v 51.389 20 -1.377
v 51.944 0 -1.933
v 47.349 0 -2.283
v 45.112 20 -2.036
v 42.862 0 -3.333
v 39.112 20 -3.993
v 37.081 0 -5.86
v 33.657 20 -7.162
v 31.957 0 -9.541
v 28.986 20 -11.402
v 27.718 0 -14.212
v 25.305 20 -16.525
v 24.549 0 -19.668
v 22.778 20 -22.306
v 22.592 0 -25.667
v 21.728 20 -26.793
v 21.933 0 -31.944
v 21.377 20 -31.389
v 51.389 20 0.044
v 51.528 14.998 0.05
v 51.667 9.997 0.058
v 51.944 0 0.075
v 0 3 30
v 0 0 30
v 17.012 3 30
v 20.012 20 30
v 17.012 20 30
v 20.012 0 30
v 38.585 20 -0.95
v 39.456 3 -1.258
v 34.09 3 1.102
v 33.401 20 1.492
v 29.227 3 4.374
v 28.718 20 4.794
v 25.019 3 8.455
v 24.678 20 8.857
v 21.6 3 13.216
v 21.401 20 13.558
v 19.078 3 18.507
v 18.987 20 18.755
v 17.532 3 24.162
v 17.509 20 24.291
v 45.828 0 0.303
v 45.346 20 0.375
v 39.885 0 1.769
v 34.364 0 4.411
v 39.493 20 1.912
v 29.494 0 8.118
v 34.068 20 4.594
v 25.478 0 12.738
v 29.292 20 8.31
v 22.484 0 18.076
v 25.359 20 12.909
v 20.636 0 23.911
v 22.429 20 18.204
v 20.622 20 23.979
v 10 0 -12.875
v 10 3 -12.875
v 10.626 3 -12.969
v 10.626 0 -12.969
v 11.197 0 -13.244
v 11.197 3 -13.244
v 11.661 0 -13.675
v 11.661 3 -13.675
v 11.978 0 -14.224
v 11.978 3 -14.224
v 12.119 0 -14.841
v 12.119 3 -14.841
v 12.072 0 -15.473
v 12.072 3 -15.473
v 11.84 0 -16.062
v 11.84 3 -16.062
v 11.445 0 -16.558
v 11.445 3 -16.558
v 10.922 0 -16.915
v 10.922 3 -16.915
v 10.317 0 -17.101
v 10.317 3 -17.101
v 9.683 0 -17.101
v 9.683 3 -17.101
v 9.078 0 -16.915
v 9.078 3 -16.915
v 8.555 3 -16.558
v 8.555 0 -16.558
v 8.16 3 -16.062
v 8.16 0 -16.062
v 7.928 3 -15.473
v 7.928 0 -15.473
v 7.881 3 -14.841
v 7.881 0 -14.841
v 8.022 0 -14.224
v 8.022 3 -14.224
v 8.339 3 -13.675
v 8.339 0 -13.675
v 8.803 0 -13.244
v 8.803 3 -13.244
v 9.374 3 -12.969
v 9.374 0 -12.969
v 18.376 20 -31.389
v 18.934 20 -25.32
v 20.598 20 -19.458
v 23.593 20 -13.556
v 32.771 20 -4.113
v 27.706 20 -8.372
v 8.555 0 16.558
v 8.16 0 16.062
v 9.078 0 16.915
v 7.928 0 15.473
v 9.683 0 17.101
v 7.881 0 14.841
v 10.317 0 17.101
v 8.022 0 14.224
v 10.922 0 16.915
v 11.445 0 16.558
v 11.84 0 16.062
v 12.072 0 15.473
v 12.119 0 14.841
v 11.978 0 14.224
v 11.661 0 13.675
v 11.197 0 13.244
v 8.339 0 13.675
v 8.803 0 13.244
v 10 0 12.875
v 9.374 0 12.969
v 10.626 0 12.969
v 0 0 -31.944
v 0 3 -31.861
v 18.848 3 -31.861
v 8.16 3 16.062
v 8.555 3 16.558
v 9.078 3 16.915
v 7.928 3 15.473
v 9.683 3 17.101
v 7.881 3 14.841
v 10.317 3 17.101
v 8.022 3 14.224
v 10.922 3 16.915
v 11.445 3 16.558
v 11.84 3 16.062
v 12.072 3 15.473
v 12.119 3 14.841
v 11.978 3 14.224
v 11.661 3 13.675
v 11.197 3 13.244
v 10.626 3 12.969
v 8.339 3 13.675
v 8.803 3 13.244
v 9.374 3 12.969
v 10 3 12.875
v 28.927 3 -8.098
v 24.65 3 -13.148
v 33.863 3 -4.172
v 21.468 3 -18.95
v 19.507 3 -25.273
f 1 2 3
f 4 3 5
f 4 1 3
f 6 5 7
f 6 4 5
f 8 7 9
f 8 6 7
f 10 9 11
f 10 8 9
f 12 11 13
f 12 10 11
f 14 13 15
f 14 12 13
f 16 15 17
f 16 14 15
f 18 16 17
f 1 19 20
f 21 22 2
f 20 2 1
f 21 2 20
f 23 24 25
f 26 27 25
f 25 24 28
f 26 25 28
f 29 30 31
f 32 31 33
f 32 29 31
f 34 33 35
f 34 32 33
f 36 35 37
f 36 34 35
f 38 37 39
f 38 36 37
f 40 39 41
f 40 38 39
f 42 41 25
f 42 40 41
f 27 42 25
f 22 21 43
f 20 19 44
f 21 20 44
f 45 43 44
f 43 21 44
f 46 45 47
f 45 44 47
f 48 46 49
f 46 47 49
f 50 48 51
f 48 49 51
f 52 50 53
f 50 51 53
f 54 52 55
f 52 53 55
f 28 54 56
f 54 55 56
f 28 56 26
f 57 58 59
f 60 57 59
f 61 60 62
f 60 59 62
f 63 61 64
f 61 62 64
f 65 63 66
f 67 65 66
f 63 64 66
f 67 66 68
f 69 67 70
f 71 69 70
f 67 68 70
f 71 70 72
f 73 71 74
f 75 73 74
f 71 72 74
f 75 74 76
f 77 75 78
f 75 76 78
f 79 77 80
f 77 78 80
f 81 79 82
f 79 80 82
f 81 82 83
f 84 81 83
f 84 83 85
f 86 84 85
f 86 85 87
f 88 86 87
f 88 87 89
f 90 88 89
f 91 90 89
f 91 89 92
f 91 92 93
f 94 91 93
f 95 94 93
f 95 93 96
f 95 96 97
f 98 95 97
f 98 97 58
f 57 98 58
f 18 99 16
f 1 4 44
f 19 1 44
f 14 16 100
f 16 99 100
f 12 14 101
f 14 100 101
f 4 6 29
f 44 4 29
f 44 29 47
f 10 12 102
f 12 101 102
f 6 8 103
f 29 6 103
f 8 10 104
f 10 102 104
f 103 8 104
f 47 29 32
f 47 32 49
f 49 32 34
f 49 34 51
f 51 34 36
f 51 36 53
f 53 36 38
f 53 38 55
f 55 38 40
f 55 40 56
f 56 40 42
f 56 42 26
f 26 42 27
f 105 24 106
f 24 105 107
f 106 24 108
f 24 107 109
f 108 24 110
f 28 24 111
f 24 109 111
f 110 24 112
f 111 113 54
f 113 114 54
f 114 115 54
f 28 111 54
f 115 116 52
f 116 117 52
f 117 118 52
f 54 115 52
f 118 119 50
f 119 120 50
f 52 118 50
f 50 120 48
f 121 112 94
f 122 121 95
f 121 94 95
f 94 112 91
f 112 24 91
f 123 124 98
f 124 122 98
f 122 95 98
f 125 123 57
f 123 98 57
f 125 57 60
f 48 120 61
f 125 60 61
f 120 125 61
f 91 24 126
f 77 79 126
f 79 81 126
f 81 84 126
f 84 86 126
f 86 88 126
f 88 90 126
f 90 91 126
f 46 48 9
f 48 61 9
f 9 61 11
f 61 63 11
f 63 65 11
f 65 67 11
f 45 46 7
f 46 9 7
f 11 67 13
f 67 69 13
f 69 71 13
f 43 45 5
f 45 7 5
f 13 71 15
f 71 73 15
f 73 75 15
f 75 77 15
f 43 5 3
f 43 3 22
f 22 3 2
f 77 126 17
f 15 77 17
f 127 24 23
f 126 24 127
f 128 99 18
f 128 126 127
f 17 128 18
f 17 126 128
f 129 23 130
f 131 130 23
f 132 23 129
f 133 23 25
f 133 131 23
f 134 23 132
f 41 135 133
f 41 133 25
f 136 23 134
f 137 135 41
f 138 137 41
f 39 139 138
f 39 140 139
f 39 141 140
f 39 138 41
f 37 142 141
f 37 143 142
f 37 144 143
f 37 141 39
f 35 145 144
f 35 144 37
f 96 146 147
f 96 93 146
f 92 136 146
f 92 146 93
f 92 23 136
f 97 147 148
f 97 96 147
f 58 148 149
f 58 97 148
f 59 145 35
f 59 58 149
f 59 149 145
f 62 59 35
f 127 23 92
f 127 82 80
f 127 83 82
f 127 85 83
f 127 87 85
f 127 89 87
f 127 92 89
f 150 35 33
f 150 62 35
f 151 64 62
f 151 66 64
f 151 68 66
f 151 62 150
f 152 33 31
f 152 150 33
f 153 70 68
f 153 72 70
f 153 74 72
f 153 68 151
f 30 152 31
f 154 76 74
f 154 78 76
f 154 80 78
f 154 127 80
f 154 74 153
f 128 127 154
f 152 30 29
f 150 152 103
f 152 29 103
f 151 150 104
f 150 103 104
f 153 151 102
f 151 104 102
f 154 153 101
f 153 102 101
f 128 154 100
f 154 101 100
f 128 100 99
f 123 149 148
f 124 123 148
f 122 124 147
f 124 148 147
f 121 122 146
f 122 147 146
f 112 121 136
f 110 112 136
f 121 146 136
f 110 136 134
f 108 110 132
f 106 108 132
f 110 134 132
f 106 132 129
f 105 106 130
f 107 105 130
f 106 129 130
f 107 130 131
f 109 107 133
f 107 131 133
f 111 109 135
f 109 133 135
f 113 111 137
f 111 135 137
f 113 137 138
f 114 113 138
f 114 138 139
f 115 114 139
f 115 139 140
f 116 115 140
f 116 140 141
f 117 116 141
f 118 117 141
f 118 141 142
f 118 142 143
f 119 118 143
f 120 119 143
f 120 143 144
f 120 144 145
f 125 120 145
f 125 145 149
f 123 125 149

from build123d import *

# Parameters (mm, degrees)
SKETCH_1_W               = 50
SKETCH_1_H               = 60
EXTRUDE_1_DEPTH          = 70
DRAFT_1_ANGLE            = 1.591
CUT_EXTRUDE_1_DEPTH      = 105.880884817
CUT_EXTRUDE_1_DEPTH_BACK = 105.880884817
SKETCH_8_R               = 30
SKETCH_9_R               = 29.988439116
CUT_EXTRUDE_2_DEPTH      = 93.836652593
SKETCH_10_W              = 61.388766385
SKETCH_10_H              = 50
CUT_EXTRUDE_3_DEPTH      = 93.836652759
SHELL_1_T                = -3
SKETCH_11_R              = 2.125
CUT_EXTRUDE_4_DEPTH      = 64.305956024


with BuildPart() as part:
    # 草圖1 → 填料-伸長1 (new body)
    with BuildSketch(Plane(origin=(0, 0, 0), x_dir=(1, 0, 0), z_dir=(0, 1, 0))):
        with Locations((25, 0)):
            Rectangle(SKETCH_1_W, SKETCH_1_H)
    extrude(amount=EXTRUDE_1_DEPTH)

    # 拔模1
    draft_1_faces = [part.faces().sort_by_distance(p)[0] for p in [
        (50, 35, 0),
        (25, 35, -30),
    ]]
    draft(draft_1_faces, Plane.ZX.offset(70), DRAFT_1_ANGLE)

    # 草圖8 → 除料-伸長1 (cut, two sides: drawn at the far end of the back side and taken through both)
    with BuildSketch(Plane(origin=(50, 70, -30), x_dir=(0.9996147856379402, 0.027743225206125616, 0.0007705771714084014), z_dir=(0.027753924659674706, -0.9992294227713525, -0.027753924659674706)).offset(-CUT_EXTRUDE_1_DEPTH_BACK)):
        Circle(SKETCH_8_R)
    extrude(amount=CUT_EXTRUDE_1_DEPTH + CUT_EXTRUDE_1_DEPTH_BACK, mode=Mode.SUBTRACT)

    # 草圖9 → 除料-伸長2 (cut, through all)
    with BuildSketch(Plane(origin=(0, 70, 0), x_dir=(1, 0, 0), z_dir=(0, 1, 0))):
        with Locations((50, -30)):
            Circle(SKETCH_9_R)
    extrude(amount=-CUT_EXTRUDE_2_DEPTH, mode=Mode.SUBTRACT)

    # 草圖10 → 除料-伸長3 (cut, through all)
    with BuildSketch(Plane.ZY):
        with Locations((-0.694383192, 45)):
            Rectangle(SKETCH_10_W, SKETCH_10_H)
    extrude(amount=-CUT_EXTRUDE_3_DEPTH, mode=Mode.SUBTRACT)

    # 薄殼1
    shell_1_openings = [part.faces().sort_by_distance(p)[0] for p in [
        (14.872442298, 20, -1.069608967),
        (10.828073147, 9.957245624, -31.667707178),
        (10.005780442, 10, 30),
        (0, 9.984986274, -0.833468336),
    ]]
    offset(amount=SHELL_1_T, openings=shell_1_openings, kind=Kind.INTERSECTION)

    # 草圖11 → 除料-伸長4 (cut, through all)
    with BuildSketch(Plane(origin=(0, 3, 0), x_dir=(1, 0, 0), z_dir=(0, 1, 0))):
        with Locations(Location((10, 15, 0), (0, 0, 270))):
            Circle(SKETCH_11_R)
        with Locations(Location((10, -15, 0), (0, 0, 90))):
            Circle(SKETCH_11_R)
    extrude(amount=-CUT_EXTRUDE_4_DEPTH, mode=Mode.SUBTRACT)


solid = part.part
